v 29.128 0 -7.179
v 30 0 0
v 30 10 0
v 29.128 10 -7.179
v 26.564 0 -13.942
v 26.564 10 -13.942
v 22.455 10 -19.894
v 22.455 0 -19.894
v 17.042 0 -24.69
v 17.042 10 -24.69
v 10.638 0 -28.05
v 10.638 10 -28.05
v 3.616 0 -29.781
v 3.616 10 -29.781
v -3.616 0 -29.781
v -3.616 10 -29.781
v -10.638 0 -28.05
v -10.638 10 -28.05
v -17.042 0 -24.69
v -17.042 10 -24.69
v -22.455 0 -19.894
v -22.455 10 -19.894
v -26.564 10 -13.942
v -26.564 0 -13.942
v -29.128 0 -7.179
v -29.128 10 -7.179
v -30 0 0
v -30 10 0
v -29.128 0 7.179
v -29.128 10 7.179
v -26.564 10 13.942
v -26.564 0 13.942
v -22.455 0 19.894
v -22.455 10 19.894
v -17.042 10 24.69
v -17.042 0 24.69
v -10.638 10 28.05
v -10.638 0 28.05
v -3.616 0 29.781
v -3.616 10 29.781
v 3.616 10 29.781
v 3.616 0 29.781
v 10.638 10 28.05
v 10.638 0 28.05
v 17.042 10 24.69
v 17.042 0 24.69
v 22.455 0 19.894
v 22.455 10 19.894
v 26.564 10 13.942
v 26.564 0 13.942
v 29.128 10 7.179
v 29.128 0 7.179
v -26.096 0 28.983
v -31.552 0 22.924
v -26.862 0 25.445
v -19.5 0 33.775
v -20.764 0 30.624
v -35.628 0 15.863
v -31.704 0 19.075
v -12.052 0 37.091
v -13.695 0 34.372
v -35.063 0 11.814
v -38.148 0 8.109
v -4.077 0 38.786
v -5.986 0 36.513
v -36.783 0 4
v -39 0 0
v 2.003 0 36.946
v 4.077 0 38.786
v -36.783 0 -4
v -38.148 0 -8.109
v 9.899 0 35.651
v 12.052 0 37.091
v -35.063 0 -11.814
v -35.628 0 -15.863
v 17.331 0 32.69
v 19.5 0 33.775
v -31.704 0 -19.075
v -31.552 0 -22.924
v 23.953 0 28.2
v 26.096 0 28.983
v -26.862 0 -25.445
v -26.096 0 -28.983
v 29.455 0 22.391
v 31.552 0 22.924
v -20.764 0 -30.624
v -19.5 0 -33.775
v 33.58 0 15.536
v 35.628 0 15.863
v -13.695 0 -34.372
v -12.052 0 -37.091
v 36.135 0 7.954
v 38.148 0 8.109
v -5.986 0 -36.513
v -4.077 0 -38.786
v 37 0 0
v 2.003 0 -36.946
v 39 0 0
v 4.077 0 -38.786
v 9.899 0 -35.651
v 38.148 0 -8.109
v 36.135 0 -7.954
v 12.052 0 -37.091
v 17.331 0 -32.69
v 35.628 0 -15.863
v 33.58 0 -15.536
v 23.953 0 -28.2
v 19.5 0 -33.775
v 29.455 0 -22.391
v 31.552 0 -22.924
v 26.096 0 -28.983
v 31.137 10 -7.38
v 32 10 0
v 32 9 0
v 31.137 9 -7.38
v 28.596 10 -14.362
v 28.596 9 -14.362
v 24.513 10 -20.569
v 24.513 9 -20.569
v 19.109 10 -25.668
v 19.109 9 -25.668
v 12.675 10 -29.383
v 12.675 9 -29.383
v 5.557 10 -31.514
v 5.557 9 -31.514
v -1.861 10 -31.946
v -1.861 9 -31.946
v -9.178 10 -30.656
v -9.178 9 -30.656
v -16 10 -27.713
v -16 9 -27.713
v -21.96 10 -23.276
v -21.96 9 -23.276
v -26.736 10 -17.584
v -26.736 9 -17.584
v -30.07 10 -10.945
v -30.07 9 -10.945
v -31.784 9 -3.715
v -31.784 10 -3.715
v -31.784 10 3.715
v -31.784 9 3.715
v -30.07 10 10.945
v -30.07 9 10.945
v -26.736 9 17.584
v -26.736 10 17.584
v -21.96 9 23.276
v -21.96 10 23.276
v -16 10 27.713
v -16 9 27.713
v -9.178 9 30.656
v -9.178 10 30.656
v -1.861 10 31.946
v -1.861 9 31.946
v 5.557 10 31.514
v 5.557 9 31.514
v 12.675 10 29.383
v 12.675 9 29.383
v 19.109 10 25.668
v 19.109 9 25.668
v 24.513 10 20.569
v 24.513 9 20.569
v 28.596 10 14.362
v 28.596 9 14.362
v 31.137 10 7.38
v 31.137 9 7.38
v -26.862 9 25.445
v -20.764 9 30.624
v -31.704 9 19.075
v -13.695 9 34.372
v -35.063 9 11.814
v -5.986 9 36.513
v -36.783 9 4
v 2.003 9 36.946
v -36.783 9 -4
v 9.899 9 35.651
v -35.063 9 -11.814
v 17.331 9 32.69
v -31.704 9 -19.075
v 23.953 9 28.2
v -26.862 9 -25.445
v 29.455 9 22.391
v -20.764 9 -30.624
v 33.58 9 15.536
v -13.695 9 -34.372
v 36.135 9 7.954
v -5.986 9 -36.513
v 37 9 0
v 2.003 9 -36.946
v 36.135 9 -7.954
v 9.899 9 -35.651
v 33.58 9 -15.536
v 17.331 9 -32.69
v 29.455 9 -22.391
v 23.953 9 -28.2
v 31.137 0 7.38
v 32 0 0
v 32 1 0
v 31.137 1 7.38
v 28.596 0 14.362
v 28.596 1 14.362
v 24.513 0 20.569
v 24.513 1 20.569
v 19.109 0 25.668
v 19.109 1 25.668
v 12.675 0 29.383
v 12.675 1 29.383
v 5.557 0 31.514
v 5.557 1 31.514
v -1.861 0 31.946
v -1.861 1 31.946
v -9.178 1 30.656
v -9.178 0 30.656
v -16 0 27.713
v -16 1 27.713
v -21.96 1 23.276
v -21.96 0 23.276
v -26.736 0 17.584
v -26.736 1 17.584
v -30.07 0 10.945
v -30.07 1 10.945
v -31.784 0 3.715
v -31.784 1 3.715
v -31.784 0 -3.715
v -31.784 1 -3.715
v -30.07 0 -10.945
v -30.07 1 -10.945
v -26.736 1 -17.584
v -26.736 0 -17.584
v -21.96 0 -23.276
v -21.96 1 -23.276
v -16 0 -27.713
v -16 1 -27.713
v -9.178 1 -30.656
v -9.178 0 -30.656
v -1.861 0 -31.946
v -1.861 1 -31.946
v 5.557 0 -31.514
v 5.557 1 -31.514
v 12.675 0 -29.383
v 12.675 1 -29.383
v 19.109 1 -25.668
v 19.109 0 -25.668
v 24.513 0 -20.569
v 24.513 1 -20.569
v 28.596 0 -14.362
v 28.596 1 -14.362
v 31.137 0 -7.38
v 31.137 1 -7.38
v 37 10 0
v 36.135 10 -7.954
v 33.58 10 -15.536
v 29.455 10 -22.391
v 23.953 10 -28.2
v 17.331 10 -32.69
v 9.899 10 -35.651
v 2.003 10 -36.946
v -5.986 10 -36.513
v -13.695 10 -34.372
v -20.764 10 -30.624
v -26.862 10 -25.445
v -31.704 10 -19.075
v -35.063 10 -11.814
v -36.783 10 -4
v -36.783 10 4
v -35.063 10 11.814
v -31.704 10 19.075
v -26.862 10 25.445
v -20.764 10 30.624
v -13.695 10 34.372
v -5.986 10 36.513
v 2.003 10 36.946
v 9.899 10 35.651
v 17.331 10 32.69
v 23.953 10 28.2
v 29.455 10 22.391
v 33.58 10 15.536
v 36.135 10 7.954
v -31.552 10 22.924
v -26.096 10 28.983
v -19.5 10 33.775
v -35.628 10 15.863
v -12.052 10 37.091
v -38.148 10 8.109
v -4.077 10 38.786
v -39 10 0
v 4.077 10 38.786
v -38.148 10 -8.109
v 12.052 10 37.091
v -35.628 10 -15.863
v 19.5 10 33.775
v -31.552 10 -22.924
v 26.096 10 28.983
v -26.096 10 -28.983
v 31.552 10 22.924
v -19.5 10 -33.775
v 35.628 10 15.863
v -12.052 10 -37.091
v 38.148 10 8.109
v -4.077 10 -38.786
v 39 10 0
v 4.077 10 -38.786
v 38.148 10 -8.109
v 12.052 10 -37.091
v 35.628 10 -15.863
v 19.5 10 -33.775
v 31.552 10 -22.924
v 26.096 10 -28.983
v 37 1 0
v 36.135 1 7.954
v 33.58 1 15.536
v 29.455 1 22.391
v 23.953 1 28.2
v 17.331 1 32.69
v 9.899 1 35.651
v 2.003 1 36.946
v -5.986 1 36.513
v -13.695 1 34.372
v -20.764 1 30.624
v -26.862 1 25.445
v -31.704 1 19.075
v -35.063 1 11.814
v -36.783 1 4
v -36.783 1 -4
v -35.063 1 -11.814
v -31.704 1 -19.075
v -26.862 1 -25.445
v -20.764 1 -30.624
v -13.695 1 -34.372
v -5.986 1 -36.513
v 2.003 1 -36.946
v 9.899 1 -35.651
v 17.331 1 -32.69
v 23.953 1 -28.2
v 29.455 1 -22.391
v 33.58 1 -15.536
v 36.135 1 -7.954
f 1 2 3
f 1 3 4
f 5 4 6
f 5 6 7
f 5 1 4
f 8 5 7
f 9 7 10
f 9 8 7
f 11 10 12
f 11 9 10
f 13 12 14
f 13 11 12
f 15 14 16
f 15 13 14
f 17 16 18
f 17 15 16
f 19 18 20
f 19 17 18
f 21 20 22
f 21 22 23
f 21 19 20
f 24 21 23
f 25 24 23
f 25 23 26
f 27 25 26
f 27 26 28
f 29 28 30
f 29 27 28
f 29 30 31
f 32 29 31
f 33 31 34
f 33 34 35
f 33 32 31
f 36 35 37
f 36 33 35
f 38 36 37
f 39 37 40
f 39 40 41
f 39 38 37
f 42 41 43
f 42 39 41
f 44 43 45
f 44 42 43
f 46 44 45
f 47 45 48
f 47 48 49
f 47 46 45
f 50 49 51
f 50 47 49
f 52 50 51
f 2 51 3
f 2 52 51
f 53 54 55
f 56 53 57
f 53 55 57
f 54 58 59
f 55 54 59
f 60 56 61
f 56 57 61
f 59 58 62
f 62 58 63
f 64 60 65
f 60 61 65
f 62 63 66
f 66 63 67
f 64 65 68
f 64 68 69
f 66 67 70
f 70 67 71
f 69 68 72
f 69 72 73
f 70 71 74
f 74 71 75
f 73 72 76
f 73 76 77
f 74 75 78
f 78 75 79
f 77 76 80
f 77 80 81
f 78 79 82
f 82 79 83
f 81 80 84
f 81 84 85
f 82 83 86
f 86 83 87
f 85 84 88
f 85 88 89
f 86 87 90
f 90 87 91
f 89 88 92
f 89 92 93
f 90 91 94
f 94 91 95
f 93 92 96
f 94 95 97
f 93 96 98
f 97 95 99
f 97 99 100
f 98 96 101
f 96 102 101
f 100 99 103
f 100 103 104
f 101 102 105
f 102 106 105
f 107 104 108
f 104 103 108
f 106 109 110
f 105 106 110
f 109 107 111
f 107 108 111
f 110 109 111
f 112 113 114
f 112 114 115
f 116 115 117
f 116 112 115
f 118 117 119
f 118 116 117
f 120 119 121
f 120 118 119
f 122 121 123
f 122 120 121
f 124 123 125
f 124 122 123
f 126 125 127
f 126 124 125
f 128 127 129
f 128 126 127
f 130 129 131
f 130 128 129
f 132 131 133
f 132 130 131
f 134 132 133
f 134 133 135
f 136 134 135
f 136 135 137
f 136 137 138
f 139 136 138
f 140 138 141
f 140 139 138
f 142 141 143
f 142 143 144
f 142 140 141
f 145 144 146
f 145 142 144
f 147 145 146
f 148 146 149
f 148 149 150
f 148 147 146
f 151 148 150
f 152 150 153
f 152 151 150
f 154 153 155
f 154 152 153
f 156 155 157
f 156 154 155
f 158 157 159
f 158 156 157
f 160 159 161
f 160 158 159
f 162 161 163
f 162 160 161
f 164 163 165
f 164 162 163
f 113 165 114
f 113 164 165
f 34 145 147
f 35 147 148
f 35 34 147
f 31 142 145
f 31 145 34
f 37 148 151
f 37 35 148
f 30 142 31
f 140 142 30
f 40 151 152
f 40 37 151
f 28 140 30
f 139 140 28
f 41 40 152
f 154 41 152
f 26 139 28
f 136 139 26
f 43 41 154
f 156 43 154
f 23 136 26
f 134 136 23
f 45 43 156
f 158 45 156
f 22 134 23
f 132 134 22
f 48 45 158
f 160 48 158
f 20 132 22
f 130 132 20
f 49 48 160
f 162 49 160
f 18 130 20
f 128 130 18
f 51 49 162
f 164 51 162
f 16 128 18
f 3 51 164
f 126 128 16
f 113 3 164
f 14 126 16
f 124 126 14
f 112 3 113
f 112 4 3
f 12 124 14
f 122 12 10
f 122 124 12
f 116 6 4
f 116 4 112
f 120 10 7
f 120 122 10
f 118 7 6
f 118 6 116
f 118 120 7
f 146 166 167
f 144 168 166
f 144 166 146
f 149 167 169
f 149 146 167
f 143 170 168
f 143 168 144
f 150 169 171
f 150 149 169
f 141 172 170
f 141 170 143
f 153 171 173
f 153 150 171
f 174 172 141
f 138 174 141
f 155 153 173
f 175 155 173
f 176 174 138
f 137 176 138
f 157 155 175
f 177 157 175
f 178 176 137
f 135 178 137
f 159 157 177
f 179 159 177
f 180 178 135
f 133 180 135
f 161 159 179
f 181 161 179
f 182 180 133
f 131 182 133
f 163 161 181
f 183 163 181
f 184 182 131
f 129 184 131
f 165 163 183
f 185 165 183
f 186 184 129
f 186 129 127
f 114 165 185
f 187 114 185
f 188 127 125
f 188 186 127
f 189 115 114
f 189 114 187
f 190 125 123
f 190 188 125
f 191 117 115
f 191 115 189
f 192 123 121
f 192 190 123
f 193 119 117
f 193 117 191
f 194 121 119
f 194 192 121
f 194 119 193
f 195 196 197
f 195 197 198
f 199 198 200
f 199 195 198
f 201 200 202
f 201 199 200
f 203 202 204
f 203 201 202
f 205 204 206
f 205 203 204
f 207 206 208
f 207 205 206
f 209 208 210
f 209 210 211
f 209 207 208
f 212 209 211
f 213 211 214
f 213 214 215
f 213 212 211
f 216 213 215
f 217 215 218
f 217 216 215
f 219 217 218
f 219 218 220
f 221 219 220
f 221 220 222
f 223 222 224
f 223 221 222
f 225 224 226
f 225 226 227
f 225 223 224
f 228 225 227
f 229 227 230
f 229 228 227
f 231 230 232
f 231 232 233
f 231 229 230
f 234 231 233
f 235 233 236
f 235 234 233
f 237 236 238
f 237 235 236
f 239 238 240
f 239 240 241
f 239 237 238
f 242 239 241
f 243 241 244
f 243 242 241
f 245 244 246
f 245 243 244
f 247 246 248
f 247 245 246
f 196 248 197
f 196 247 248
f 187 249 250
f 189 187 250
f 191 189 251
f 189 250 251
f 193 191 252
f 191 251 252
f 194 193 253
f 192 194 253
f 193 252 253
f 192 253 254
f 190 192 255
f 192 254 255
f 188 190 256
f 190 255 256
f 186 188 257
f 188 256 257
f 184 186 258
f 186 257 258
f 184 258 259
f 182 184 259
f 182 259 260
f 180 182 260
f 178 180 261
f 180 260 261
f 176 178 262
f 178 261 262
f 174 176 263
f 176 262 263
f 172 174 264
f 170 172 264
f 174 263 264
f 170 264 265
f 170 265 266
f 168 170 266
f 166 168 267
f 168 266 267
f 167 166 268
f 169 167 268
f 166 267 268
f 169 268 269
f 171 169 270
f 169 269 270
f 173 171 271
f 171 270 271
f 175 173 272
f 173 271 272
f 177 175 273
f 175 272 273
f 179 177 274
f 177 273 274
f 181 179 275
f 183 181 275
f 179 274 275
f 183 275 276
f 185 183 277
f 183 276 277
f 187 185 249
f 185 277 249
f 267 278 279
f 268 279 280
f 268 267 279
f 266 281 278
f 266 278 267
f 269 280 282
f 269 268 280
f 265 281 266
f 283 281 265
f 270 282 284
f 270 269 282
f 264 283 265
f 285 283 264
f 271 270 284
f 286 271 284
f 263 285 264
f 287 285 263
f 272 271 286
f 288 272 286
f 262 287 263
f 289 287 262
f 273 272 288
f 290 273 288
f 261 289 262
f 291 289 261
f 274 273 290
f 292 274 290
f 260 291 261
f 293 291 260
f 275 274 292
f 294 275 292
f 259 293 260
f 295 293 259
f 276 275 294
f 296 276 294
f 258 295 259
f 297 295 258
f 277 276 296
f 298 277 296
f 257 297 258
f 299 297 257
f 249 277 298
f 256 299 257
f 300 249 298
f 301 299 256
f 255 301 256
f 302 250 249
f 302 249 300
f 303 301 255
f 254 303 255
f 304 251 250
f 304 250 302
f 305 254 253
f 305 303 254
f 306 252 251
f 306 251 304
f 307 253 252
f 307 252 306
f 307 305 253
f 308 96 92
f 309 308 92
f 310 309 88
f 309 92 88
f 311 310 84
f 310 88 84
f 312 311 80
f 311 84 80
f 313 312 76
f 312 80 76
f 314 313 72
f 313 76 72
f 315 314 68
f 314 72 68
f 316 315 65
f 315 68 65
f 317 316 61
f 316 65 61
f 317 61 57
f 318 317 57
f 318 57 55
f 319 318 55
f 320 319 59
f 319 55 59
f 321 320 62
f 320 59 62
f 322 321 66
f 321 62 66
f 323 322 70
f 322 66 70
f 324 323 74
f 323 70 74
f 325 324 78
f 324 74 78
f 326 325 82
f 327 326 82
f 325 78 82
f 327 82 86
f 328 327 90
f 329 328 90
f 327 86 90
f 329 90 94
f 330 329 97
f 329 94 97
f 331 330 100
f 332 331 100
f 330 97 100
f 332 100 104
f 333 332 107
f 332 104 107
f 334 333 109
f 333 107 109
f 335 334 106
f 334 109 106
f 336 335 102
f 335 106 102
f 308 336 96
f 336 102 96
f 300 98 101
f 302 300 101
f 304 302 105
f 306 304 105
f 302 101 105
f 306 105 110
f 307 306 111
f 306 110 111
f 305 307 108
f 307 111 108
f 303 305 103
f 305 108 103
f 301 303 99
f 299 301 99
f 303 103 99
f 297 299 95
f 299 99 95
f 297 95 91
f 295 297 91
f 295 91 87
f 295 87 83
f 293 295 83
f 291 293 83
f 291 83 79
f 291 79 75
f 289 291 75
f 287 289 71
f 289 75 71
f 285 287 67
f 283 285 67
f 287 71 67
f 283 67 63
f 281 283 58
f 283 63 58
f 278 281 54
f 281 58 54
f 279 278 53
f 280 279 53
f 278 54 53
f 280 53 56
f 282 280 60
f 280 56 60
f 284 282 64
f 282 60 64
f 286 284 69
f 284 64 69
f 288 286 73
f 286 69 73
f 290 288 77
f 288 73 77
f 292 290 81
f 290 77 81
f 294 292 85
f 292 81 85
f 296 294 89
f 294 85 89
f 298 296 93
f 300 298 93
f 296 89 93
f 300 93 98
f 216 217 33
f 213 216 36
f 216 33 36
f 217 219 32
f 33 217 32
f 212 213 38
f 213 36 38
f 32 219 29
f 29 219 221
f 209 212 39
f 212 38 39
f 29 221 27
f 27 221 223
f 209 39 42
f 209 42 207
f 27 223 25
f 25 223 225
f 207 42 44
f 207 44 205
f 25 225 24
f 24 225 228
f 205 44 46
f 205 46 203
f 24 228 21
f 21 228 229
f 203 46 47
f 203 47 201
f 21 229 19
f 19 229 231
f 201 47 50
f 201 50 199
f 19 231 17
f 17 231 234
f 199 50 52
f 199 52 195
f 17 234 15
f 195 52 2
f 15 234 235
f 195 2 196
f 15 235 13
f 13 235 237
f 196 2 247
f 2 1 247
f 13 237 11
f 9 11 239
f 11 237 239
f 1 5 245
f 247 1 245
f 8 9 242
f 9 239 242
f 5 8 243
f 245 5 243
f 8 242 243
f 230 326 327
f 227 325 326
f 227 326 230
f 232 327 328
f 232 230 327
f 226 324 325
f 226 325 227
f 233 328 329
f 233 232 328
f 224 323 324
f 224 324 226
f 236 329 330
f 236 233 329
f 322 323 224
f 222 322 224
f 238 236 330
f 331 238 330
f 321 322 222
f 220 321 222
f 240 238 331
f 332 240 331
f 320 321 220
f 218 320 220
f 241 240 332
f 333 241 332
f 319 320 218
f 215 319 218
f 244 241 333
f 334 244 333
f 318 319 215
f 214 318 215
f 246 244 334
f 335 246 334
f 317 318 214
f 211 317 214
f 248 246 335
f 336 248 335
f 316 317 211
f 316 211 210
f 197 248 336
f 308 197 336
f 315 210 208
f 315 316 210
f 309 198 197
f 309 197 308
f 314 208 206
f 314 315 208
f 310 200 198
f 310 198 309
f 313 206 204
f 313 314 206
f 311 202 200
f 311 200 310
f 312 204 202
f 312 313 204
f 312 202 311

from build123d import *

# Parameters (mm, degrees)
SKETCH1_R           = 39
SKETCH1_R_2         = 30
BOSS_EXTRUDE1_DEPTH = 10
SKETCH2_R           = 37
SKETCH2_R_2         = 32
CUT_EXTRUDE1_DEPTH  = 1
SKETCH3_R           = 37
SKETCH3_R_2         = 32
CUT_EXTRUDE2_DEPTH  = 1


with BuildPart() as part:
    # Sketch1 → Boss-Extrude1 (new body)
    with BuildSketch(Plane(origin=(0, 0, 0), x_dir=(1, 0, 0), z_dir=(0, 1, 0))):
        Circle(SKETCH1_R)
        Circle(SKETCH1_R_2, mode=Mode.SUBTRACT)
    extrude(amount=BOSS_EXTRUDE1_DEPTH)

    # Sketch2 → Cut-Extrude1 (cut)
    with BuildSketch(Plane(origin=(0, 10, 0), x_dir=(1, 0, 0), z_dir=(0, 1, 0))):
        Circle(SKETCH2_R)
        Circle(SKETCH2_R_2, mode=Mode.SUBTRACT)
    extrude(amount=-CUT_EXTRUDE1_DEPTH, mode=Mode.SUBTRACT)

    # Sketch3 → Cut-Extrude2 (cut)
    with BuildSketch(Plane.XZ):
        Circle(SKETCH3_R)
        Circle(SKETCH3_R_2, mode=Mode.SUBTRACT)
    extrude(amount=-CUT_EXTRUDE2_DEPTH, mode=Mode.SUBTRACT)


solid = part.part
